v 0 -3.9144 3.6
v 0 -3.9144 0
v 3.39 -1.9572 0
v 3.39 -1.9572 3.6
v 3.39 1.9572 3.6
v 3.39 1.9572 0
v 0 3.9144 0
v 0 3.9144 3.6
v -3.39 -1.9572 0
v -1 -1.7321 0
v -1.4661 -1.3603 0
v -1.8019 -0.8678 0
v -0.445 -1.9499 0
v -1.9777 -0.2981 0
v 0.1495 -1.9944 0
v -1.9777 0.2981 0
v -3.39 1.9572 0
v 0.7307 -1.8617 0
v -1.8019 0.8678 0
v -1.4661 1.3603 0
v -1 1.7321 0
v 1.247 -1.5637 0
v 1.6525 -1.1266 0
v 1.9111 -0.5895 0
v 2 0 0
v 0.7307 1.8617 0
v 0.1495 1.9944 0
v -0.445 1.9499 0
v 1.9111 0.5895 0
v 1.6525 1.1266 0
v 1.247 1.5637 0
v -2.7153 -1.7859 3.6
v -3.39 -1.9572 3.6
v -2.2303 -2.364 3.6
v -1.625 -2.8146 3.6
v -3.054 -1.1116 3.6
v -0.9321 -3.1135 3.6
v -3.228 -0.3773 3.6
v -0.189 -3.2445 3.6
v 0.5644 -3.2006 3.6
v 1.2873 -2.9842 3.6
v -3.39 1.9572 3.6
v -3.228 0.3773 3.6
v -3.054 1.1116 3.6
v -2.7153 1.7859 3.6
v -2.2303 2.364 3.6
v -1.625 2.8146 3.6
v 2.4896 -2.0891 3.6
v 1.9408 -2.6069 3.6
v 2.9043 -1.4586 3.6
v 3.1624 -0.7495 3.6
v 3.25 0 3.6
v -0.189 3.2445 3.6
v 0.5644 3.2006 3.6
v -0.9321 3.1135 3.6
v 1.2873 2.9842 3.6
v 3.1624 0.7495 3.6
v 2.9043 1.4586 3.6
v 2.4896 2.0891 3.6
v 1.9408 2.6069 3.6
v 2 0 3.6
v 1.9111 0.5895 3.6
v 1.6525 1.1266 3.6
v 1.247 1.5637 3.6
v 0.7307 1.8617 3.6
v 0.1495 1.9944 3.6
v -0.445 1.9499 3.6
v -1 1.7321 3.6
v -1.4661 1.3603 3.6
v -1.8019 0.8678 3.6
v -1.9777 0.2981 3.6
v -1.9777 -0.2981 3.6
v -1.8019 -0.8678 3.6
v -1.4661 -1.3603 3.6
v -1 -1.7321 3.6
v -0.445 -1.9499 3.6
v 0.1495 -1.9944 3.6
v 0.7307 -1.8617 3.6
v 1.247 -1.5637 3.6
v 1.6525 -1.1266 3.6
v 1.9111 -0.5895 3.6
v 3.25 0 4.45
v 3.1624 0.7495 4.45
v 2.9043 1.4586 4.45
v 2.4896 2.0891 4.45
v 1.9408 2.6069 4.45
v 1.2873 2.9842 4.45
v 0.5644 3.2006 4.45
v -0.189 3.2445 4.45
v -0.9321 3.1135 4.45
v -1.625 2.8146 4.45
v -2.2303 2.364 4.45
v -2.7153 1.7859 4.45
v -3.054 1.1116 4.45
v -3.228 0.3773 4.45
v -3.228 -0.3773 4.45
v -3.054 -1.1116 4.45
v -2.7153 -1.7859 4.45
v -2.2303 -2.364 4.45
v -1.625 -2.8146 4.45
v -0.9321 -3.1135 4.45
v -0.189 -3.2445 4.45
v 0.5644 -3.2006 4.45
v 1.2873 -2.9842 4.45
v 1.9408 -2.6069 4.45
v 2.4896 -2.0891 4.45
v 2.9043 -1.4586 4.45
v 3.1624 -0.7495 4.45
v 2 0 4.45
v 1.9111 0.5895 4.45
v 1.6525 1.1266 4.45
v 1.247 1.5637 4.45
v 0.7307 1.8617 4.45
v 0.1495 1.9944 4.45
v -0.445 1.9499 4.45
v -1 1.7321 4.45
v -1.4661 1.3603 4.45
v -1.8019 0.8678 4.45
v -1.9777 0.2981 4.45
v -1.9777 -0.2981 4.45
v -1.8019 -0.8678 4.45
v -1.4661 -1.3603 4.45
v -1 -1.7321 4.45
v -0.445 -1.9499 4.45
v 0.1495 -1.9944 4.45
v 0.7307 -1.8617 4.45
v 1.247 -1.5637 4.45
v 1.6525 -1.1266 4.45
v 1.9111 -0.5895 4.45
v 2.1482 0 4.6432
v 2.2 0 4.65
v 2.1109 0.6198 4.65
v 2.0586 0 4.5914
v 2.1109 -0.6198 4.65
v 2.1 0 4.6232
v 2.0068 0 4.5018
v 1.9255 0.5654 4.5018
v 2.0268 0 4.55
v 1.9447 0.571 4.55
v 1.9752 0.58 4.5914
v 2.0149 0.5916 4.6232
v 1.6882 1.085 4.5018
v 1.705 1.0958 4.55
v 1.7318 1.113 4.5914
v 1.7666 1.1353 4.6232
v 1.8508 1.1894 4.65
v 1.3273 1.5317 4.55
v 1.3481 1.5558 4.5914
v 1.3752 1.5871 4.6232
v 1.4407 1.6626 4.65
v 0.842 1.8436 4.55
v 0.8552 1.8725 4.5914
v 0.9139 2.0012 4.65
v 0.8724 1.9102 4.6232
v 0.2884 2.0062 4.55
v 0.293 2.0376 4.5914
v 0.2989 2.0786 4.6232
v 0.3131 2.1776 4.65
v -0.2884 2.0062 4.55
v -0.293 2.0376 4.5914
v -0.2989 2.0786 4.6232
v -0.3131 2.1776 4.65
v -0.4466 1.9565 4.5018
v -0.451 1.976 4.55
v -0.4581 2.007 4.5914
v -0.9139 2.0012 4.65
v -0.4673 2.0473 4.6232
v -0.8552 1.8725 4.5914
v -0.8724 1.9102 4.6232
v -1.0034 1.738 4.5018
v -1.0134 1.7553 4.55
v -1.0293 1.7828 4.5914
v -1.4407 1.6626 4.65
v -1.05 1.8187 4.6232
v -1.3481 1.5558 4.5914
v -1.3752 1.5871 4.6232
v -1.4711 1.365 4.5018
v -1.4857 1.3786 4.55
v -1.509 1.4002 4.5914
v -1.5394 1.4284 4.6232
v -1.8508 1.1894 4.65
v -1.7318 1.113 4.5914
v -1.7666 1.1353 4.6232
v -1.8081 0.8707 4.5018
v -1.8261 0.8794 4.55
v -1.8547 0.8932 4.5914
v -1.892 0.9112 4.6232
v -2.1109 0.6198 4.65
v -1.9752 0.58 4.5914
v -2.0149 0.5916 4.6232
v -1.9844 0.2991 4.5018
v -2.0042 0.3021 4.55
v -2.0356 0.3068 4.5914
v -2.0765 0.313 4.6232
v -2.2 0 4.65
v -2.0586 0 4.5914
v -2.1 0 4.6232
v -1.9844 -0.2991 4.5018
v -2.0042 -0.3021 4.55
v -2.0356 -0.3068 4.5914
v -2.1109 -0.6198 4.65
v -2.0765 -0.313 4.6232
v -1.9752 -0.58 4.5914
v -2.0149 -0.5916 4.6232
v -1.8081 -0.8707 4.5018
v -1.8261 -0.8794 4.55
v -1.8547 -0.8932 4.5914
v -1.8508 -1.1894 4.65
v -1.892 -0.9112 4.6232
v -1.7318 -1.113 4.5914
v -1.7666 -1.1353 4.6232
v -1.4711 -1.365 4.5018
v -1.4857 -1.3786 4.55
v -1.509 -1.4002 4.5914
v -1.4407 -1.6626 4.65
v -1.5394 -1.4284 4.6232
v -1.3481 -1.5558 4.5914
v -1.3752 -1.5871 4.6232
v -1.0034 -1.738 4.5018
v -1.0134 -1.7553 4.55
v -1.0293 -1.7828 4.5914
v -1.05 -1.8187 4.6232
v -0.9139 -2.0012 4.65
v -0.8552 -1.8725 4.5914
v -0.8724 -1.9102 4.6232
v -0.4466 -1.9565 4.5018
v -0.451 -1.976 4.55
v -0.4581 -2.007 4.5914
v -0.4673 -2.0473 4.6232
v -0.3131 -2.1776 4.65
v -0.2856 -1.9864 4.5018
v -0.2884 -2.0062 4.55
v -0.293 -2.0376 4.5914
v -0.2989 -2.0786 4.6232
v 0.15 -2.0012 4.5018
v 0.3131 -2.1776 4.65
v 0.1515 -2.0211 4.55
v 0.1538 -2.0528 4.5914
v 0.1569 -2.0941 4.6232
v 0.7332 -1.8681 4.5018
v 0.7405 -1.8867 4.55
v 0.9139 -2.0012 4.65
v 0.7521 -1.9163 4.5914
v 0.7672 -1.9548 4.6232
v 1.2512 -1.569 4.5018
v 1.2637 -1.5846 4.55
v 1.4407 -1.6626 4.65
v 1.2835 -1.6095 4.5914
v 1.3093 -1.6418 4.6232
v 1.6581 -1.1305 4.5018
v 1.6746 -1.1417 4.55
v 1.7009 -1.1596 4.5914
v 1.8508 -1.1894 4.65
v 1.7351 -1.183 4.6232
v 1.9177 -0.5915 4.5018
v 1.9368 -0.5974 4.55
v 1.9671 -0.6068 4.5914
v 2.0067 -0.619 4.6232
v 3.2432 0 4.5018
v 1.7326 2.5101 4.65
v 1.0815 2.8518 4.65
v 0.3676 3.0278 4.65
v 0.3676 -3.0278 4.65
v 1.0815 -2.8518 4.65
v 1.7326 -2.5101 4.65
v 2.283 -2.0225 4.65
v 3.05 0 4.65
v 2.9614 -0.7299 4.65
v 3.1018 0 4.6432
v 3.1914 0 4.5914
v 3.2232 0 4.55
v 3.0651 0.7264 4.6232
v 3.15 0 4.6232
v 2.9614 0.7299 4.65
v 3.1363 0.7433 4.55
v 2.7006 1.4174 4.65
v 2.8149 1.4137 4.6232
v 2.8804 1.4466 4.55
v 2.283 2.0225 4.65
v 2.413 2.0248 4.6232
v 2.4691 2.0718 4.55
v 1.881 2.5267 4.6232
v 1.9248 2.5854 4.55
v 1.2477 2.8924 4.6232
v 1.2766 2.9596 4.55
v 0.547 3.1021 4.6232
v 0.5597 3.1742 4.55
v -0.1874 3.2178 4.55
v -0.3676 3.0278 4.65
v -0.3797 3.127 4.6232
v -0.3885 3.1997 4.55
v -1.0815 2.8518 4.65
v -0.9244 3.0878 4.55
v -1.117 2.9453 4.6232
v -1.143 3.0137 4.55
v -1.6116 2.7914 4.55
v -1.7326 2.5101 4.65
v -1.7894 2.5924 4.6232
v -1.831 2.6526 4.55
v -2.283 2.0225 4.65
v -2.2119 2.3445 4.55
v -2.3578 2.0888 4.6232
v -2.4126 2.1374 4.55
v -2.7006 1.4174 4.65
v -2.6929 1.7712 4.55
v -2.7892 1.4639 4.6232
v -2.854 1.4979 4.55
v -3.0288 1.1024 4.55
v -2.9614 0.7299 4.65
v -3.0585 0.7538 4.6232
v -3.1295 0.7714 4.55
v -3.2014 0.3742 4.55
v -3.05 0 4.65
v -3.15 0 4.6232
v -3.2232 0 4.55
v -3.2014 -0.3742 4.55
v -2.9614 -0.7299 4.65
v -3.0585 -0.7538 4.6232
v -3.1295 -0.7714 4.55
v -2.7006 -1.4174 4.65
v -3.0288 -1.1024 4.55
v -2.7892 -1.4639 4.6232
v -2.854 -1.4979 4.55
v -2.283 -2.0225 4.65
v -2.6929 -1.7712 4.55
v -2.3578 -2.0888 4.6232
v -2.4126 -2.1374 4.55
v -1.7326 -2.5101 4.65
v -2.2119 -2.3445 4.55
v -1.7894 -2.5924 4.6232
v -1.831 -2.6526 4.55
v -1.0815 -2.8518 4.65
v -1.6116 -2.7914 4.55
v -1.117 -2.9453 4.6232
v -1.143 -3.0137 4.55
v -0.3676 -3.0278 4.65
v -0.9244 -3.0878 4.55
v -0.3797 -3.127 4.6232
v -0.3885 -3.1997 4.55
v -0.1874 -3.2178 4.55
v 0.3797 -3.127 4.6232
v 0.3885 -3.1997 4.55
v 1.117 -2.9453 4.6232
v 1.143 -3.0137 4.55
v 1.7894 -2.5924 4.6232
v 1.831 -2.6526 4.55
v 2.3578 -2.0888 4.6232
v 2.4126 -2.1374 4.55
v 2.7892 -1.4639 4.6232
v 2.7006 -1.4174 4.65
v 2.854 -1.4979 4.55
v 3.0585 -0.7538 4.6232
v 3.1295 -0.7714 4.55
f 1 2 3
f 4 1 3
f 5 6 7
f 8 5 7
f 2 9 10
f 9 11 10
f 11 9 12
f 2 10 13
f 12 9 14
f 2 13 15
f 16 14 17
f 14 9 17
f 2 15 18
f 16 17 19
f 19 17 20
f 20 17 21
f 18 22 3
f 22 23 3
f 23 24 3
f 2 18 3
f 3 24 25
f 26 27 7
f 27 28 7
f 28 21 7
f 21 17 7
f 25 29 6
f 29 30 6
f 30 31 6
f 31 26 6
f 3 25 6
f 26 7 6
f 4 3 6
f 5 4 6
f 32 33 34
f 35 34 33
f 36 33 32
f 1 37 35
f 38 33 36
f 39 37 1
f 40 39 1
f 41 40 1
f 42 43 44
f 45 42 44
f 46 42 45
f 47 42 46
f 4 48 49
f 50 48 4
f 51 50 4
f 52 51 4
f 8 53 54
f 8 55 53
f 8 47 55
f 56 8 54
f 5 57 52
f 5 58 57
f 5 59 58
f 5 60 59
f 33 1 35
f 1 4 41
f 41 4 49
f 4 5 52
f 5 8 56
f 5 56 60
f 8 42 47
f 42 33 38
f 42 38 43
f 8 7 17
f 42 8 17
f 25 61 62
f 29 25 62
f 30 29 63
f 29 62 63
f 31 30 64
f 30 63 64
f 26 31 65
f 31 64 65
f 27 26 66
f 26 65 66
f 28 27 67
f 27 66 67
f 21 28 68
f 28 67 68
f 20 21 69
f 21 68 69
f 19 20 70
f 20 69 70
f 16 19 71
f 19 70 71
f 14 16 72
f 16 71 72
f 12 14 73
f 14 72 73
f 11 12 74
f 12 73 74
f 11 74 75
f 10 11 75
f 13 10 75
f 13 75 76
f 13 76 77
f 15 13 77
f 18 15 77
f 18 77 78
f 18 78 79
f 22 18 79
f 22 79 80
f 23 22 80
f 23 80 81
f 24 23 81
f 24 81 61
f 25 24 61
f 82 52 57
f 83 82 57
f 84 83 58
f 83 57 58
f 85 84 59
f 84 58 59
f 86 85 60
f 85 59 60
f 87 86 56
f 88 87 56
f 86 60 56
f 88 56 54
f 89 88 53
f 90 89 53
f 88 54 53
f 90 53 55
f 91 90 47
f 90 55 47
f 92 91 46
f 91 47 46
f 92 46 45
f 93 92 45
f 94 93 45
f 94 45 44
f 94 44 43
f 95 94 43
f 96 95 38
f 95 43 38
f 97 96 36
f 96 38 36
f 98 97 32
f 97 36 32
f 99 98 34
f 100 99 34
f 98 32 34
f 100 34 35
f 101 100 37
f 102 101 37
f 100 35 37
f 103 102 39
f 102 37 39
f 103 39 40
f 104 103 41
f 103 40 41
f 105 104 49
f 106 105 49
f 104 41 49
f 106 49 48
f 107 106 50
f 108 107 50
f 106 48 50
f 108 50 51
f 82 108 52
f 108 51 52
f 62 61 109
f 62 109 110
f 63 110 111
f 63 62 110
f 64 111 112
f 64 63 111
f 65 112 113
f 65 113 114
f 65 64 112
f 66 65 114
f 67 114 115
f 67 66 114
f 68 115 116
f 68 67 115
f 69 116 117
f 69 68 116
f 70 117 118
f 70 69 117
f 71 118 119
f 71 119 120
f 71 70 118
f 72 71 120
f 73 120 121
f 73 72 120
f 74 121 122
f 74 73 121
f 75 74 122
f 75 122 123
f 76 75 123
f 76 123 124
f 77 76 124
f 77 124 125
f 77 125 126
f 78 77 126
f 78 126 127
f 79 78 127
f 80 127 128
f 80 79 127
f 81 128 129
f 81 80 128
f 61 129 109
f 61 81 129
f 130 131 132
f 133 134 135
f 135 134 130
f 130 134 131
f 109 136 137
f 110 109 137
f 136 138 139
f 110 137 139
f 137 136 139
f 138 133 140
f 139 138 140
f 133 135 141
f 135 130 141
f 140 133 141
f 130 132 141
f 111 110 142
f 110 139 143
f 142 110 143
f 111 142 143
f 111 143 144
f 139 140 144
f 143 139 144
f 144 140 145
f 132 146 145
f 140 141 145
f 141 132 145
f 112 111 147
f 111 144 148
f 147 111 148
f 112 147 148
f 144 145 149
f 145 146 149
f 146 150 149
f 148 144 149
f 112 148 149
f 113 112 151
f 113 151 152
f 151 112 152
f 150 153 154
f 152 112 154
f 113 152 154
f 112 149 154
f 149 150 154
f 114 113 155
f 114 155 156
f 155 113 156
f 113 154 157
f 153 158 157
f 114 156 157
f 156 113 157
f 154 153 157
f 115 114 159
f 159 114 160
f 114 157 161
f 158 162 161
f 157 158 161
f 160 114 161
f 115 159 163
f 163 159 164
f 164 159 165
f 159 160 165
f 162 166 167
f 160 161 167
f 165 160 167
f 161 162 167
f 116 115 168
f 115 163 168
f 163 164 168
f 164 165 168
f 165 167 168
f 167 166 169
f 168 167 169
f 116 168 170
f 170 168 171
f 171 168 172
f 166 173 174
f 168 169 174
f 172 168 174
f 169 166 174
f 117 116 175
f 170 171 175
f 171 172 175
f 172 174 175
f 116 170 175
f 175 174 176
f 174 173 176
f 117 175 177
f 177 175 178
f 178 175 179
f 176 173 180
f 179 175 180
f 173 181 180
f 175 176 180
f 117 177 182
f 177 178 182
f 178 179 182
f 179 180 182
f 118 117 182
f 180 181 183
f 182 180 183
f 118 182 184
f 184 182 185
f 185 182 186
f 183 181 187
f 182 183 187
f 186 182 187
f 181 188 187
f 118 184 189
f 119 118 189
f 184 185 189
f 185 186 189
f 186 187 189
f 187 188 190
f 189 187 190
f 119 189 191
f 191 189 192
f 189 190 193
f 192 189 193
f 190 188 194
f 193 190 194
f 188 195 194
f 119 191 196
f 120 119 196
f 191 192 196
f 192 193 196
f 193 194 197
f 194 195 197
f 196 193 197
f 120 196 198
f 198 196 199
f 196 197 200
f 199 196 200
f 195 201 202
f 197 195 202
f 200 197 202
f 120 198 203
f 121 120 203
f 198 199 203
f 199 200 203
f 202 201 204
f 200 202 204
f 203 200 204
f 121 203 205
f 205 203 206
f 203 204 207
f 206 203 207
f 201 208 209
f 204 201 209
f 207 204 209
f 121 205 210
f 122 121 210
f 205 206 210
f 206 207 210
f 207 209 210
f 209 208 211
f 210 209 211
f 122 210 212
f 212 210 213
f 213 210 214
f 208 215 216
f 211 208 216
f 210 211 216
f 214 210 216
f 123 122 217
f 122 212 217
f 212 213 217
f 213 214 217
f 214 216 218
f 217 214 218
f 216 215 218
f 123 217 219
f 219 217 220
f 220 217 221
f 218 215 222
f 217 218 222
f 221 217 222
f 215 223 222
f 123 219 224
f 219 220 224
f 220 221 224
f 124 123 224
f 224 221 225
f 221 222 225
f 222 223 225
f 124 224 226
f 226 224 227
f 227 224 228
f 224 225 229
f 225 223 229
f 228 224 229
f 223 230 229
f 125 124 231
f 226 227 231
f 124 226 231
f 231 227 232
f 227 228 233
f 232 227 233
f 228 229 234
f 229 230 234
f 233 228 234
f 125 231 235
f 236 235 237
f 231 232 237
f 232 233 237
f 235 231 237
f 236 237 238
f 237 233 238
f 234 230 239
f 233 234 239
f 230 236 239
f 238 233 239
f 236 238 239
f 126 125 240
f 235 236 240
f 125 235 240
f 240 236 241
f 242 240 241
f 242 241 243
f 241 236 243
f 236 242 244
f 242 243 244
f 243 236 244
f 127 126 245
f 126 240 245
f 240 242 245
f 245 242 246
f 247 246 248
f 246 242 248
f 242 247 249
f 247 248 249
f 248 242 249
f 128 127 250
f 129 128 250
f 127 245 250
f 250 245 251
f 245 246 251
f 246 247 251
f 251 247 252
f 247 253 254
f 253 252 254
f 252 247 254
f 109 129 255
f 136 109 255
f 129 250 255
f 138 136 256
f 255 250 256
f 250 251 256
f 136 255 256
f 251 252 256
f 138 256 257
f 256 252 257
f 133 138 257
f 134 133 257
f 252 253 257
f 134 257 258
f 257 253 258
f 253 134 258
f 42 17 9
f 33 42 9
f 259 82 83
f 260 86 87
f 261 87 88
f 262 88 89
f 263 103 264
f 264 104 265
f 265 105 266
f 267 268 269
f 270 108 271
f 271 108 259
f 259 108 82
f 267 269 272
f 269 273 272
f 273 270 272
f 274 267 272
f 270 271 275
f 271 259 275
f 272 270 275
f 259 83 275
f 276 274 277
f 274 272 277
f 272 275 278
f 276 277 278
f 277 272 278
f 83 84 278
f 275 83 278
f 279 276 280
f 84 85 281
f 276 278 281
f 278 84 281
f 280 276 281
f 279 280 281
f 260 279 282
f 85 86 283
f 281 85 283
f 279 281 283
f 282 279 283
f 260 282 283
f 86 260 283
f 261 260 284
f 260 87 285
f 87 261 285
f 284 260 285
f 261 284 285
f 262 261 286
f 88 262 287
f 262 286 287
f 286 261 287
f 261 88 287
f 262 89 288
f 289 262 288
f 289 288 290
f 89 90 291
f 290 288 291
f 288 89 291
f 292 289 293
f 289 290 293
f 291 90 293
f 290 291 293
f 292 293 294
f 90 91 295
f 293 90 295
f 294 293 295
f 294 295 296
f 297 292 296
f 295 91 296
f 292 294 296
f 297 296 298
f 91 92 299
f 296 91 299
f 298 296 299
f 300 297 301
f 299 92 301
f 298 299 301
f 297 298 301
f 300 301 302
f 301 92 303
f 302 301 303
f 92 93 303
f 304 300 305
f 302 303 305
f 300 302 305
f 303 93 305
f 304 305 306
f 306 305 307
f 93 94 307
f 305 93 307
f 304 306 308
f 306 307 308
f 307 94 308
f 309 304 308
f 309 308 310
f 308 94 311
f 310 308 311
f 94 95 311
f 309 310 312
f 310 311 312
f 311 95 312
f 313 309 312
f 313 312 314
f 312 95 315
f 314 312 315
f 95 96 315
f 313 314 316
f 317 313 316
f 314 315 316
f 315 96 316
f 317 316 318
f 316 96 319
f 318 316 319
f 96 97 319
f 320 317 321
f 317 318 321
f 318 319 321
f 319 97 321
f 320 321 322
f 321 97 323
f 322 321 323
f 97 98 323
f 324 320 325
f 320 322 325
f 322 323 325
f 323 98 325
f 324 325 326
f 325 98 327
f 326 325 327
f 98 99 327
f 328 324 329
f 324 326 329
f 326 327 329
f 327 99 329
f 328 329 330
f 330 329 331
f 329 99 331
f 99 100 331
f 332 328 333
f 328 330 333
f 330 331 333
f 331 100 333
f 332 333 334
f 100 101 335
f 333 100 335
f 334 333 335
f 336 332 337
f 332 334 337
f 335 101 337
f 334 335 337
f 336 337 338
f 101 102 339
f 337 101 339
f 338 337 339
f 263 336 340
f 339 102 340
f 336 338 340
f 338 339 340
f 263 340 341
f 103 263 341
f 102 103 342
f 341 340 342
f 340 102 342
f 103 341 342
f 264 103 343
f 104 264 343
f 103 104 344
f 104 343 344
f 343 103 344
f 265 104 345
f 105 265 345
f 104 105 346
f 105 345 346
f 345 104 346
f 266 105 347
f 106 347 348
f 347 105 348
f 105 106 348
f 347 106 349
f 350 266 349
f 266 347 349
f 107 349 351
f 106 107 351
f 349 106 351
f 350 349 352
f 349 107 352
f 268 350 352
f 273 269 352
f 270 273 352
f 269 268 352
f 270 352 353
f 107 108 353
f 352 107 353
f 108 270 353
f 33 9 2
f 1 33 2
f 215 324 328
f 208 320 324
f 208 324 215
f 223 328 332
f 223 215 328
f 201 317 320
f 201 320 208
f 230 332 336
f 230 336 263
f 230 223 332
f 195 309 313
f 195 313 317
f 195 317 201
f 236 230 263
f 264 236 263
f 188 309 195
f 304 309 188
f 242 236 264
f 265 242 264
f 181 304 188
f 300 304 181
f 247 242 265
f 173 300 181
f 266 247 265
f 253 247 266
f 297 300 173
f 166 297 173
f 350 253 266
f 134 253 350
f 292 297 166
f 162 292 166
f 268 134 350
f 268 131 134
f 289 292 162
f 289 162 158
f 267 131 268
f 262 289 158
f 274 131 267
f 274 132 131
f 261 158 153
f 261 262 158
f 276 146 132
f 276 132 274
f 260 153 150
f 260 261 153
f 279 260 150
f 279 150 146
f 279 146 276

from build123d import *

# Parameters (mm, degrees)
EXTRUDE_1_DEPTH     = 3.6
SKETCH_2_R          = 3.25
SKETCH_2_R_2        = 2
EXTRUDE_2_DEPTH     = 1.05
SKETCH_3_R          = 2
CUT_EXTRUDE_1_DEPTH = 7.306734496
FILLET_1_R          = 0.2
FILLET_2_R          = 0.2


with BuildPart() as part:
    # 草图1 → 凸台-拉伸1 (new body)
    with BuildSketch(Plane.XY):
        Polygon((-3.39, -1.957217413), (0, -3.914434825), (3.39, -1.957217413), (3.39, 1.957217413), (0, 3.914434825), (-3.39, 1.957217413), align=None)
    extrude(amount=EXTRUDE_1_DEPTH)

    # 草图2 → 凸台-拉伸2 (add)
    with BuildSketch(Plane.XY.offset(3.6)):
        Circle(SKETCH_2_R)
        Circle(SKETCH_2_R_2, mode=Mode.SUBTRACT)
    extrude(amount=EXTRUDE_2_DEPTH)

    # 草图3 → 切除-拉伸1 (cut, through all)
    with BuildSketch(Plane.XY.offset(3.6)):
        Circle(SKETCH_3_R)
    extrude(amount=-CUT_EXTRUDE_1_DEPTH, mode=Mode.SUBTRACT)

    # 圆角1
    fillet_1_edges = [part.edges().sort_by_distance(p)[0] for p in [
        (-2, 0, 4.65),
    ]]
    fillet(fillet_1_edges, radius=FILLET_1_R)

    # 圆角2
    fillet_2_edges = [part.edges().sort_by_distance(p)[0] for p in [
        (-3.25, 0, 4.65),
    ]]
    fillet(fillet_2_edges, radius=FILLET_2_R)


solid = part.part
